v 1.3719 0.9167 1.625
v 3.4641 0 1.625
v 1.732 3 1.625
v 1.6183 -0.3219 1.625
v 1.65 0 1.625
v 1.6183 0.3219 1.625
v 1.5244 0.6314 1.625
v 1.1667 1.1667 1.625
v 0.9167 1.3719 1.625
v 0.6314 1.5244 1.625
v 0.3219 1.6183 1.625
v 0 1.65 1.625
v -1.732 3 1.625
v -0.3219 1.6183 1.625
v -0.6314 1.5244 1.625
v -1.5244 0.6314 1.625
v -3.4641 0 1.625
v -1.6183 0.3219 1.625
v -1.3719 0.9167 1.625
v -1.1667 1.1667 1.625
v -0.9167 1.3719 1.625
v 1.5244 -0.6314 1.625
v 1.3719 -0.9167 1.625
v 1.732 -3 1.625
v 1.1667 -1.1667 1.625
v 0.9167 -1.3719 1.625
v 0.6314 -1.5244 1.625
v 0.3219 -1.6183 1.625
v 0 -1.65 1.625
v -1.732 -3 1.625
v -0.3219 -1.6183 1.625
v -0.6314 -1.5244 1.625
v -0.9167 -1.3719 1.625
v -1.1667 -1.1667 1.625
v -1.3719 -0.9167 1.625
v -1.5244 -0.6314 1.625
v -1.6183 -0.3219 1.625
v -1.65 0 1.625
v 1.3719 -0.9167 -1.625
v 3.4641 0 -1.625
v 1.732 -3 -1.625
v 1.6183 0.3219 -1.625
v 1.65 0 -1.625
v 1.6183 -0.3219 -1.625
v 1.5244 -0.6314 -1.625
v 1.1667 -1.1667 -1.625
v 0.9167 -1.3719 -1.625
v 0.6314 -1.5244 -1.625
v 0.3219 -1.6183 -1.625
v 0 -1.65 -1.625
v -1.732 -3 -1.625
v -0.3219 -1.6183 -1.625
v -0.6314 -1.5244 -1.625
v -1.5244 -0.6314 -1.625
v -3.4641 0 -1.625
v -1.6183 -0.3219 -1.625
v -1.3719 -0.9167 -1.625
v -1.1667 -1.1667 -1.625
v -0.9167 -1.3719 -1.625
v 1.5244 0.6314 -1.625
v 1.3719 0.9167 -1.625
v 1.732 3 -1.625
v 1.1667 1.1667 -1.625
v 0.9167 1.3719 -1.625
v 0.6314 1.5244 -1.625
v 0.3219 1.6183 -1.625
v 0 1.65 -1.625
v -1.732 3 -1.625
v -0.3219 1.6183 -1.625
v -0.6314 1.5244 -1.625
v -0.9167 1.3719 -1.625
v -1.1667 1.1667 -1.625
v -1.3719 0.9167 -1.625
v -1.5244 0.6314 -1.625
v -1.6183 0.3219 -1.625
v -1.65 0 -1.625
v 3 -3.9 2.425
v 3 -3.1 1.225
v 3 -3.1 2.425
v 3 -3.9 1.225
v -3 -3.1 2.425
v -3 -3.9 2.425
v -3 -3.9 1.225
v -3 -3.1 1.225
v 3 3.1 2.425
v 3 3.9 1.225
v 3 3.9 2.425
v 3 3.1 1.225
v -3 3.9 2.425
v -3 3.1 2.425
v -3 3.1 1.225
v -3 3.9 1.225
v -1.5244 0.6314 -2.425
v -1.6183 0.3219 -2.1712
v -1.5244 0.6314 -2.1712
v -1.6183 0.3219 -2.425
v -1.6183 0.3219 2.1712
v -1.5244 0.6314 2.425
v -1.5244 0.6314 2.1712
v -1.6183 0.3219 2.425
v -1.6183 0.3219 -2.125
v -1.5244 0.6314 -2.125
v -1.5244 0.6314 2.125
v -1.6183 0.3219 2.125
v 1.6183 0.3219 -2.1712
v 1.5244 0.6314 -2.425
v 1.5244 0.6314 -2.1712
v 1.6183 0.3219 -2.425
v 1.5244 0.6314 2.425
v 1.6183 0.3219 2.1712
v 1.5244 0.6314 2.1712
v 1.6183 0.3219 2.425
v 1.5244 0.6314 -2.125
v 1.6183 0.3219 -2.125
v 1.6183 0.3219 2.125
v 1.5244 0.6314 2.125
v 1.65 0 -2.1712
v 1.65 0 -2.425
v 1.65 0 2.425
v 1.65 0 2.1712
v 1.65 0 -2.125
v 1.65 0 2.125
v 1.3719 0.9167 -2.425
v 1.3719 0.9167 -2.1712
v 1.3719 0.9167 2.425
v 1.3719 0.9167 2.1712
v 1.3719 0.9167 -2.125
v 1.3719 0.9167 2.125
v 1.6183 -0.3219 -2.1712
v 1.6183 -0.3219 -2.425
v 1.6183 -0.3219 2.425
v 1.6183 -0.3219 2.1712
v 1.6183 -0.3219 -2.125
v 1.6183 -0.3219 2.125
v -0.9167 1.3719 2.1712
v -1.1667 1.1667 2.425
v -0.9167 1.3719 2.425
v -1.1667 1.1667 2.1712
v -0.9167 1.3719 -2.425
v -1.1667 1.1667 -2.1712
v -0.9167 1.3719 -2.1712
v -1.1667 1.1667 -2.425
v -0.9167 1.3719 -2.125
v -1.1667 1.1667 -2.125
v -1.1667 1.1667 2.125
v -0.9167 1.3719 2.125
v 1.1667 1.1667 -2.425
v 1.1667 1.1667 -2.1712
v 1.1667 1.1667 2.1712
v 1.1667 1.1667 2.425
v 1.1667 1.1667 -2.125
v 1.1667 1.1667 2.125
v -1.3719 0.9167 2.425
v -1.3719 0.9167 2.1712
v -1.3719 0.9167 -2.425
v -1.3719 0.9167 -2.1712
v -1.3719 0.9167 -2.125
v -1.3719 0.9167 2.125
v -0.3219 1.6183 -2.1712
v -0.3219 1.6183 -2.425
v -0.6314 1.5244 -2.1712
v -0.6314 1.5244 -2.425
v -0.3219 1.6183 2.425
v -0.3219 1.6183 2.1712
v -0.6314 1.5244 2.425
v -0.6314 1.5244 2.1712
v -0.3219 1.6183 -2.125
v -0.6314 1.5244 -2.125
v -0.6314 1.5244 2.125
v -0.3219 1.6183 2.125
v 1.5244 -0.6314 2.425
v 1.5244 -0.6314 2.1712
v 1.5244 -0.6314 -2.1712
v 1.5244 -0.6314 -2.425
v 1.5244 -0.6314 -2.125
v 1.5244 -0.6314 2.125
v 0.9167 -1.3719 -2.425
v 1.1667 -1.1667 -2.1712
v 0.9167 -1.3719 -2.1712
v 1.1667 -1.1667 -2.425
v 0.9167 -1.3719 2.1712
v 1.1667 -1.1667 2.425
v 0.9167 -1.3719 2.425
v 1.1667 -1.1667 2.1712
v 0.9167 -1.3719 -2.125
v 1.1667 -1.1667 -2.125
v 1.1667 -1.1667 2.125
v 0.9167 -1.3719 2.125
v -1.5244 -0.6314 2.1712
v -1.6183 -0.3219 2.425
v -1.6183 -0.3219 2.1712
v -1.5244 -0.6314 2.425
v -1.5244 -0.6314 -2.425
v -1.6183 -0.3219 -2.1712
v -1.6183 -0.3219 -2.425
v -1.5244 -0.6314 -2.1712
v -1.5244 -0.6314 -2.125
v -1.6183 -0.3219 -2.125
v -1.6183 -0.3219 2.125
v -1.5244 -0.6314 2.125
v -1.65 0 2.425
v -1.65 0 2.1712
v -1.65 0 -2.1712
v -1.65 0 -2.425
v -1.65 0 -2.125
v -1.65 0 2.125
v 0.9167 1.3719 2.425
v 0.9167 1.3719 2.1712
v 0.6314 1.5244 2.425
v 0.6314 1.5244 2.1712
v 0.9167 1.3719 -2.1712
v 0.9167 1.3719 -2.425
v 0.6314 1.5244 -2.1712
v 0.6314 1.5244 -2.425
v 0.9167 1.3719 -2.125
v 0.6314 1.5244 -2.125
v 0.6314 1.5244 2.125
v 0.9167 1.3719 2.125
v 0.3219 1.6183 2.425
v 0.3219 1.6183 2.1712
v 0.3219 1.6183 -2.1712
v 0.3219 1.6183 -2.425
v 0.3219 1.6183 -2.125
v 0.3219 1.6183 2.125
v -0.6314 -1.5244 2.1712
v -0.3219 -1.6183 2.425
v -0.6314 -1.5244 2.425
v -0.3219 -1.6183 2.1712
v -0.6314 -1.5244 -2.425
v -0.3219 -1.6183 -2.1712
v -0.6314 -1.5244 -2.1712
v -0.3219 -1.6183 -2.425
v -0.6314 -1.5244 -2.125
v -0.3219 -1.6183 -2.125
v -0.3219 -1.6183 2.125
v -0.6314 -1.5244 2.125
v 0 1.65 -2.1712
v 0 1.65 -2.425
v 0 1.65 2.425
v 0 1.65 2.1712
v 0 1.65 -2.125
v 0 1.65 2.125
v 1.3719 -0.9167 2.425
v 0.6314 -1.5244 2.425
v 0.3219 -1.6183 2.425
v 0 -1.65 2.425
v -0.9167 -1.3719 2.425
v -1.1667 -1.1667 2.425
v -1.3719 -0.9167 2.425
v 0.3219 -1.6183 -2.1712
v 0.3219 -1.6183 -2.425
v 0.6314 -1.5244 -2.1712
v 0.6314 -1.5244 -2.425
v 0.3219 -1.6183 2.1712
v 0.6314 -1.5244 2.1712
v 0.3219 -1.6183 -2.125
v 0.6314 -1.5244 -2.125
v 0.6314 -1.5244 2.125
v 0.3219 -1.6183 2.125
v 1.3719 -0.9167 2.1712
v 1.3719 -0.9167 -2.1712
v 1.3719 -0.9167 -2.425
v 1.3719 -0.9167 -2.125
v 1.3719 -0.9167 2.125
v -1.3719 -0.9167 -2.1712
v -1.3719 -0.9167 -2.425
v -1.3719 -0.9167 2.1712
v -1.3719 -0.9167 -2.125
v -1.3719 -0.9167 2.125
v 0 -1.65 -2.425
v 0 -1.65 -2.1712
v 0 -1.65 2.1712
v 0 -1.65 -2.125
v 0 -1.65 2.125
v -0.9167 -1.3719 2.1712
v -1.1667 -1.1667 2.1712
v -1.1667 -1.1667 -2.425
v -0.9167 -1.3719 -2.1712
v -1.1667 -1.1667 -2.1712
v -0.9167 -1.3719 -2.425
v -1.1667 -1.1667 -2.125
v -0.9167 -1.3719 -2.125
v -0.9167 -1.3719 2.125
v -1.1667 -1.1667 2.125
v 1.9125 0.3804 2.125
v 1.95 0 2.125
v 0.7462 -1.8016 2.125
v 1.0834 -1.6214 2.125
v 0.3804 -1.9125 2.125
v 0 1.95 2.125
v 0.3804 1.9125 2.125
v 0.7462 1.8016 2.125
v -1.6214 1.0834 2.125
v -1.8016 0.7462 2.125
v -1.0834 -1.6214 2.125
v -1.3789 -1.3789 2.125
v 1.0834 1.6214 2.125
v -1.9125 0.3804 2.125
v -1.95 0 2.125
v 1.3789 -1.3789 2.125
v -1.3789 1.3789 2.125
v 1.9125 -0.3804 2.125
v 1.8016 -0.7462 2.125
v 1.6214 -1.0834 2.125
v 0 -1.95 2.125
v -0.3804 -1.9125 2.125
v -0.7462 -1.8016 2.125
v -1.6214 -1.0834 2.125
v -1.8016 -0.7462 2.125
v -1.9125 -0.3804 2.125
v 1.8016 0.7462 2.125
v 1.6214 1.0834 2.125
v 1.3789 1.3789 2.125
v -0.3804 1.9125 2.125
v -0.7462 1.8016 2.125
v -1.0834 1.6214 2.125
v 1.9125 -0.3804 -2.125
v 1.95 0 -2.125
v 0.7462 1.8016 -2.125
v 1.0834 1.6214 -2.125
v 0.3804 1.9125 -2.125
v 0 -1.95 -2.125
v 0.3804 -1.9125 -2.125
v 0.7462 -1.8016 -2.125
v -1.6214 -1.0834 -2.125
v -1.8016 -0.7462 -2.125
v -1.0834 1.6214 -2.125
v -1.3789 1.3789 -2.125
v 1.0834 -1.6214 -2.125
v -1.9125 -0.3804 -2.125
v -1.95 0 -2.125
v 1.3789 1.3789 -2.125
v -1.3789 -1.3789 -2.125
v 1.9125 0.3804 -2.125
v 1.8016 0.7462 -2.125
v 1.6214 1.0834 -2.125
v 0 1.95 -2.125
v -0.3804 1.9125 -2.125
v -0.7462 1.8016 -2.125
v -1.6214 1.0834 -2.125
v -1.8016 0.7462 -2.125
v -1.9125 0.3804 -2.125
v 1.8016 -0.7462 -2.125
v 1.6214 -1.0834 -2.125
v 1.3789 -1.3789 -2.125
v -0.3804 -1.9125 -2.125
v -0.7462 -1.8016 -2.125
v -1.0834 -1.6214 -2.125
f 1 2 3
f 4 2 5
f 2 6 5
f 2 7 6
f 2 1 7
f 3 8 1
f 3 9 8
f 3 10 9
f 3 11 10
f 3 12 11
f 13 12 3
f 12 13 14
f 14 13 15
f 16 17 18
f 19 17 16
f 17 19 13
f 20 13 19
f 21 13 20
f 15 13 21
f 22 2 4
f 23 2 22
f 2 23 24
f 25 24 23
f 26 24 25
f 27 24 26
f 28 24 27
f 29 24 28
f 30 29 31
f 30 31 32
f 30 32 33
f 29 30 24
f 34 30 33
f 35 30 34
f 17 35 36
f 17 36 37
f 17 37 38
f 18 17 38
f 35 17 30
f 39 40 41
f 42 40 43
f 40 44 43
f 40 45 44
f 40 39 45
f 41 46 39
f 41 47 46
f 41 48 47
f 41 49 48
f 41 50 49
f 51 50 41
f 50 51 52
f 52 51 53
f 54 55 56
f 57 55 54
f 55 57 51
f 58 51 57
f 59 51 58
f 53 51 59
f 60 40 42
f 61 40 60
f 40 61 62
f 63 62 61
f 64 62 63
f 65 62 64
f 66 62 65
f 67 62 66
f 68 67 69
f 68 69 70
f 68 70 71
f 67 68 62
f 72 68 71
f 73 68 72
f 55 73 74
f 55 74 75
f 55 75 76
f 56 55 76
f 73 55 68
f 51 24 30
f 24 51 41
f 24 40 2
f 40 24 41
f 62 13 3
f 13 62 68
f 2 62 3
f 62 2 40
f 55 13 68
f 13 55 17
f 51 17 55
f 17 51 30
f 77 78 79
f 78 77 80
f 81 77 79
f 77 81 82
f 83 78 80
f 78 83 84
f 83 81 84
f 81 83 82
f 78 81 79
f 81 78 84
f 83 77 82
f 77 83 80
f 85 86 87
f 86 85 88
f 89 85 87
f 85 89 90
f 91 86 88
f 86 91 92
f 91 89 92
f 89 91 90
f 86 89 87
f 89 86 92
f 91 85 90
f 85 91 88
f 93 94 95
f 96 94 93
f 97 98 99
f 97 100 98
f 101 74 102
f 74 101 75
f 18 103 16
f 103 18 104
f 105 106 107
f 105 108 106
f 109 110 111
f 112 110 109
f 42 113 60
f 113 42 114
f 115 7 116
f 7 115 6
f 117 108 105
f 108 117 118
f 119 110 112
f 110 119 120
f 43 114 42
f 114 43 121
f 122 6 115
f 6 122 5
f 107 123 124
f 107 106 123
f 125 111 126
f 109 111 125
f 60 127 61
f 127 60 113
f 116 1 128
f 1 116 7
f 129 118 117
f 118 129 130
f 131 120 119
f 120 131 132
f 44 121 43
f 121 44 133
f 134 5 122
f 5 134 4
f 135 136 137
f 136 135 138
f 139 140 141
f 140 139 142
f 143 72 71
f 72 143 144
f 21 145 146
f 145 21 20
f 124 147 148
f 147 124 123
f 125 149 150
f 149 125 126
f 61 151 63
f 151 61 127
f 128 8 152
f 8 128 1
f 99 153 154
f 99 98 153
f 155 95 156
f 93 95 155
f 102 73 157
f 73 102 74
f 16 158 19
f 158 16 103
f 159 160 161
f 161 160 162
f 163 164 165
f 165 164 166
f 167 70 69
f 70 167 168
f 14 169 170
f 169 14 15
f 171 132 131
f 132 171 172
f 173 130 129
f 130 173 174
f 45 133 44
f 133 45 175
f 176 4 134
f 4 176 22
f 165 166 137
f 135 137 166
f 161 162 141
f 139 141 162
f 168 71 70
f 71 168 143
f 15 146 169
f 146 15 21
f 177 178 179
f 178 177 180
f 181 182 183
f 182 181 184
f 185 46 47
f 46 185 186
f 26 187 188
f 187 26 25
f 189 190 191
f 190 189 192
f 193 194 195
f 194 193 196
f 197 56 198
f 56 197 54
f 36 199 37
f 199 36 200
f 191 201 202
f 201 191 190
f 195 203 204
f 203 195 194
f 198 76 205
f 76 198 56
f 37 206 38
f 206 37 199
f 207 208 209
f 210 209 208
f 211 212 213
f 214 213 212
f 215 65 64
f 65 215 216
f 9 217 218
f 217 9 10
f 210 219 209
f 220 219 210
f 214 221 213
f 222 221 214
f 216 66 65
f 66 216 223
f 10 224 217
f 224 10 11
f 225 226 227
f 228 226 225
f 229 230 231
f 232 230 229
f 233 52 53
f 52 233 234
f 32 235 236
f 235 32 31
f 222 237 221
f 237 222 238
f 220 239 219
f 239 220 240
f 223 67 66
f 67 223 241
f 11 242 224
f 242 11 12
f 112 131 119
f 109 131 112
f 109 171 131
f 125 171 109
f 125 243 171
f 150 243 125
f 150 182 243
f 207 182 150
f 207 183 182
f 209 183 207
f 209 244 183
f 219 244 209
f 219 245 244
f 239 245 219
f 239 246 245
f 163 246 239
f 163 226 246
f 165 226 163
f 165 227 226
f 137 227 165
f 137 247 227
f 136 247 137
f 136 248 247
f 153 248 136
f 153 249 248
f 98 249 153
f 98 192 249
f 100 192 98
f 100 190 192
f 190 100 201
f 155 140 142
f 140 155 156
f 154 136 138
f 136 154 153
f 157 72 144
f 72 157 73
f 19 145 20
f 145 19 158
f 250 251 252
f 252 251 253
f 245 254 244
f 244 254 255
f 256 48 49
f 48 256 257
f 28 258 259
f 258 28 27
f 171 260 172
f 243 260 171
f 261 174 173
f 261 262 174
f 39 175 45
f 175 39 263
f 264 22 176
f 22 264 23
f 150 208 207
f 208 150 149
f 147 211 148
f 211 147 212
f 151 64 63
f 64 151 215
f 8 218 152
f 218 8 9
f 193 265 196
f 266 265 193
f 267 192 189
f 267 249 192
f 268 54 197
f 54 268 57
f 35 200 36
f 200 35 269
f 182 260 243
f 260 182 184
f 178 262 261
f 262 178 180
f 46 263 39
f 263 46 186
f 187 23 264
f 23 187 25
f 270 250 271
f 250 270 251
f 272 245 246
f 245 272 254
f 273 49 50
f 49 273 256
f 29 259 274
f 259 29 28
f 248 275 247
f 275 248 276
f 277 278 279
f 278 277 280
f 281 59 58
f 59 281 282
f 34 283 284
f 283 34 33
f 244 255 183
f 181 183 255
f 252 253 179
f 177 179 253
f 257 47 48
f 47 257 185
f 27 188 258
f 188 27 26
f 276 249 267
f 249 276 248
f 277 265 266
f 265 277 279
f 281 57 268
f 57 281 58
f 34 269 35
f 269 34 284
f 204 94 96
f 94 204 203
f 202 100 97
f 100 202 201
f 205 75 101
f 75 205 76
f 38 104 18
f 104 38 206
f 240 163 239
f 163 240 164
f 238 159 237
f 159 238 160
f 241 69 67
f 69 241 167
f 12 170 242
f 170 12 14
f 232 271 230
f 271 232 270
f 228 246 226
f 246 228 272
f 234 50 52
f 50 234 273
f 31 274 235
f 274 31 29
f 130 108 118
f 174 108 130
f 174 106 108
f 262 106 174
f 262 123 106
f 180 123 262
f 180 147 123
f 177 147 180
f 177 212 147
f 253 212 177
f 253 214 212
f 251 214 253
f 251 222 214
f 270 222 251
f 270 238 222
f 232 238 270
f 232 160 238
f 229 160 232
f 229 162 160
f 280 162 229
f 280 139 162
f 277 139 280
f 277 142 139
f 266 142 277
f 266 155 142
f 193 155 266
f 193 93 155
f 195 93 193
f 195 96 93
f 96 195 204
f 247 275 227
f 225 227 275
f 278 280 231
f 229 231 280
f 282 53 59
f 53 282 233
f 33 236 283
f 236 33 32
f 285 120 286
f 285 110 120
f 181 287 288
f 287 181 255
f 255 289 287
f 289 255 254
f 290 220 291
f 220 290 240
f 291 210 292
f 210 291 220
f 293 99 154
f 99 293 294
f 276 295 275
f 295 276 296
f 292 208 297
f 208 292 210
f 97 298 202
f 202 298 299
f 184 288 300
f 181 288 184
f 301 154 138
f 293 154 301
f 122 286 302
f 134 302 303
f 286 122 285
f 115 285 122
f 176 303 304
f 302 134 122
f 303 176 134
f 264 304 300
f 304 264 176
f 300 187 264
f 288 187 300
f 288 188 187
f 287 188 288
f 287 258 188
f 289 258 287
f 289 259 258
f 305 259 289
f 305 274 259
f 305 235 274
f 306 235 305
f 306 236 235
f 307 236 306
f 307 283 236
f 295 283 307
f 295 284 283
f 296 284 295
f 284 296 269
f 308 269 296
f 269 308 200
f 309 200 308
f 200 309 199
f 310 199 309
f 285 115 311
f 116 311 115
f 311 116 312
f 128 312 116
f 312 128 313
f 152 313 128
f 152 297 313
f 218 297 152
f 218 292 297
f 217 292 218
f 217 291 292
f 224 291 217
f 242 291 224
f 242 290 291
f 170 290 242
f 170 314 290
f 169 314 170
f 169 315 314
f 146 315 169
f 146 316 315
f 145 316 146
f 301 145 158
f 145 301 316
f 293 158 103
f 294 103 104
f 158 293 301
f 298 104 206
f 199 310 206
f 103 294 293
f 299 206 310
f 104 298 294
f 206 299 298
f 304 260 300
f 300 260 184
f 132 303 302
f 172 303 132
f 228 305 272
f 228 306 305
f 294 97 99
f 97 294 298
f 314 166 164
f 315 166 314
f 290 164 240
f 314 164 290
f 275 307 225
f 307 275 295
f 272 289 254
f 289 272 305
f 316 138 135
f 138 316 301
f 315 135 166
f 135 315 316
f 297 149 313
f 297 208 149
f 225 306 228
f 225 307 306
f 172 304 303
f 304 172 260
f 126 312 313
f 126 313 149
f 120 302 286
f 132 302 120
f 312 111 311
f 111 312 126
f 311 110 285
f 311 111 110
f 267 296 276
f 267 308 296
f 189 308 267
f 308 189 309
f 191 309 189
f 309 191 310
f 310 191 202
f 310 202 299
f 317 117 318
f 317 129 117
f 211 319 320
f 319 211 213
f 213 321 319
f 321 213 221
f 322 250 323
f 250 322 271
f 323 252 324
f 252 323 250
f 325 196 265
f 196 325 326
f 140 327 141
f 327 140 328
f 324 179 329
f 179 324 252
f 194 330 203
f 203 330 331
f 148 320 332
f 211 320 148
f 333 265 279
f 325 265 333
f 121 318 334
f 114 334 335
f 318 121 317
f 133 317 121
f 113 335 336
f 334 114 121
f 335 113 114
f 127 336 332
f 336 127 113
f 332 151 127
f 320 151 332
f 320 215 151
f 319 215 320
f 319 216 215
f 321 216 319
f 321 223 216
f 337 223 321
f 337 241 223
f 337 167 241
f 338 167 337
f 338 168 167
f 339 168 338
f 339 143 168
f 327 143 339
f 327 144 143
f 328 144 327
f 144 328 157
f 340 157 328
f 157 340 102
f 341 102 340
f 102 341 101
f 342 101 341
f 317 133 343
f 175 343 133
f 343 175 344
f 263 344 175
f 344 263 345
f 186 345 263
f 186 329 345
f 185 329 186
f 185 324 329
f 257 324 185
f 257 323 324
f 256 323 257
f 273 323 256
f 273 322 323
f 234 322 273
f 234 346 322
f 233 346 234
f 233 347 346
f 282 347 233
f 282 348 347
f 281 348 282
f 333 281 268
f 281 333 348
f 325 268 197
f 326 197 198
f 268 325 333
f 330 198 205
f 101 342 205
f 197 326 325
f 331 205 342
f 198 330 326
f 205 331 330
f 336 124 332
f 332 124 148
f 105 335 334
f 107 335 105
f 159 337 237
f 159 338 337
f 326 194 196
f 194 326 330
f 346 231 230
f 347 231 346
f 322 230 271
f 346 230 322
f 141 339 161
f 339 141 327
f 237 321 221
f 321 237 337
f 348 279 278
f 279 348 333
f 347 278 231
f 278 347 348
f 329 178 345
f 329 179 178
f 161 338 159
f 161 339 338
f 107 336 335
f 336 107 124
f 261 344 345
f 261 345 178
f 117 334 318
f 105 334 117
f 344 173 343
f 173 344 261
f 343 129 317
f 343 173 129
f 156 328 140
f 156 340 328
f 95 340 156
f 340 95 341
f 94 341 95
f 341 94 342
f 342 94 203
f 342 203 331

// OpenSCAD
// Parameters
screw_thread_diameter = 4.0; //[2.0:8.0:0.1]
thread_pitch = 0.7; //[0.4:1.5:0.05]
pilot_hole_diameter_if_untapped = 3.3; //[2.0:6.0:0.05]
threaded_hole_diameter = 3.3; //[2.0:6.0:0.05]
across_flats = 6.0; //[3.0:12.0:0.1]
thickness = 3.25; //[1.6:6.5:0.05]
chamfer_size = 0.3; //[0.0:1.0:0.05]
clearance_fit = 0.1; //[0.0:0.5:0.05]
corner_radius = 0.2; //[0.0:1.0:0.05]
slot_width = 8.0; //[4.0:16.0:0.1]
slot_lip_opening = 6.0; //[3.0:12.0:0.1]
slot_depth = 6.0; //[3.0:12.0:0.1]
body_length_along_slot = 12.0; //[6.0:24.0:0.1]
body_width_across_slot = 7.8; //[4.0:16.0:0.1]
anti_rotation_wing_thickness = 0.8; //[0.3:2.0:0.05]
anti_rotation_wing_height = 1.2; //[0.5:3.0:0.05]
anti_rotation_wing_length = 6.0; //[3.0:12.0:0.1]
overlap = 0.8; //[0.2:2.0:0.1]

// Nut and Washer - complete geometry
module nut_and_washer() {
  color("DimGray") {
    // T-slot nut body
    intersection() {
      translate([0, 0, 0])
        cube([body_length_along_slot, body_width_across_slot, thickness], center=true);
      translate([0, 0, 0])
        rotate([0, 0, 0])
        cylinder(h=thickness, r=across_flats/(2*cos(30)), center=true, $fn=6);
    }
    
    // Anti-rotation wings
    union() {
      translate([0, -(body_width_across_slot/2 + anti_rotation_wing_thickness/2 - overlap), (thickness/2 - anti_rotation_wing_height/2 + overlap)])
        cube([anti_rotation_wing_length, anti_rotation_wing_thickness, anti_rotation_wing_height], center=true);
      translate([0, (body_width_across_slot/2 + anti_rotation_wing_thickness/2 - overlap), (thickness/2 - anti_rotation_wing_height/2 + overlap)])
        cube([anti_rotation_wing_length, anti_rotation_wing_thickness, anti_rotation_wing_height], center=true);
    }
  }
  
  // Central threaded hole with chamfers
  difference() {
    translate([0, 0, 0])
      union() {
        cylinder(h=thickness + 2*overlap, r=threaded_hole_diameter/2, center=true, $fn=32);
        translate([0, 0, thickness/2 - chamfer_size/2 + overlap])
          cylinder(h=chamfer_size, r1=threaded_hole_diameter/2 + chamfer_size, r2=0, center=true, $fn=32);
        translate([0, 0, -(thickness/2 - chamfer_size/2 + overlap)])
          rotate([180, 0, 0])
          cylinder(h=chamfer_size, r1=threaded_hole_diameter/2 + chamfer_size, r2=0, center=true, $fn=32);
      }
  }
}

// Assembly
module assembly() {
  nut_and_washer();
}

assembly();
